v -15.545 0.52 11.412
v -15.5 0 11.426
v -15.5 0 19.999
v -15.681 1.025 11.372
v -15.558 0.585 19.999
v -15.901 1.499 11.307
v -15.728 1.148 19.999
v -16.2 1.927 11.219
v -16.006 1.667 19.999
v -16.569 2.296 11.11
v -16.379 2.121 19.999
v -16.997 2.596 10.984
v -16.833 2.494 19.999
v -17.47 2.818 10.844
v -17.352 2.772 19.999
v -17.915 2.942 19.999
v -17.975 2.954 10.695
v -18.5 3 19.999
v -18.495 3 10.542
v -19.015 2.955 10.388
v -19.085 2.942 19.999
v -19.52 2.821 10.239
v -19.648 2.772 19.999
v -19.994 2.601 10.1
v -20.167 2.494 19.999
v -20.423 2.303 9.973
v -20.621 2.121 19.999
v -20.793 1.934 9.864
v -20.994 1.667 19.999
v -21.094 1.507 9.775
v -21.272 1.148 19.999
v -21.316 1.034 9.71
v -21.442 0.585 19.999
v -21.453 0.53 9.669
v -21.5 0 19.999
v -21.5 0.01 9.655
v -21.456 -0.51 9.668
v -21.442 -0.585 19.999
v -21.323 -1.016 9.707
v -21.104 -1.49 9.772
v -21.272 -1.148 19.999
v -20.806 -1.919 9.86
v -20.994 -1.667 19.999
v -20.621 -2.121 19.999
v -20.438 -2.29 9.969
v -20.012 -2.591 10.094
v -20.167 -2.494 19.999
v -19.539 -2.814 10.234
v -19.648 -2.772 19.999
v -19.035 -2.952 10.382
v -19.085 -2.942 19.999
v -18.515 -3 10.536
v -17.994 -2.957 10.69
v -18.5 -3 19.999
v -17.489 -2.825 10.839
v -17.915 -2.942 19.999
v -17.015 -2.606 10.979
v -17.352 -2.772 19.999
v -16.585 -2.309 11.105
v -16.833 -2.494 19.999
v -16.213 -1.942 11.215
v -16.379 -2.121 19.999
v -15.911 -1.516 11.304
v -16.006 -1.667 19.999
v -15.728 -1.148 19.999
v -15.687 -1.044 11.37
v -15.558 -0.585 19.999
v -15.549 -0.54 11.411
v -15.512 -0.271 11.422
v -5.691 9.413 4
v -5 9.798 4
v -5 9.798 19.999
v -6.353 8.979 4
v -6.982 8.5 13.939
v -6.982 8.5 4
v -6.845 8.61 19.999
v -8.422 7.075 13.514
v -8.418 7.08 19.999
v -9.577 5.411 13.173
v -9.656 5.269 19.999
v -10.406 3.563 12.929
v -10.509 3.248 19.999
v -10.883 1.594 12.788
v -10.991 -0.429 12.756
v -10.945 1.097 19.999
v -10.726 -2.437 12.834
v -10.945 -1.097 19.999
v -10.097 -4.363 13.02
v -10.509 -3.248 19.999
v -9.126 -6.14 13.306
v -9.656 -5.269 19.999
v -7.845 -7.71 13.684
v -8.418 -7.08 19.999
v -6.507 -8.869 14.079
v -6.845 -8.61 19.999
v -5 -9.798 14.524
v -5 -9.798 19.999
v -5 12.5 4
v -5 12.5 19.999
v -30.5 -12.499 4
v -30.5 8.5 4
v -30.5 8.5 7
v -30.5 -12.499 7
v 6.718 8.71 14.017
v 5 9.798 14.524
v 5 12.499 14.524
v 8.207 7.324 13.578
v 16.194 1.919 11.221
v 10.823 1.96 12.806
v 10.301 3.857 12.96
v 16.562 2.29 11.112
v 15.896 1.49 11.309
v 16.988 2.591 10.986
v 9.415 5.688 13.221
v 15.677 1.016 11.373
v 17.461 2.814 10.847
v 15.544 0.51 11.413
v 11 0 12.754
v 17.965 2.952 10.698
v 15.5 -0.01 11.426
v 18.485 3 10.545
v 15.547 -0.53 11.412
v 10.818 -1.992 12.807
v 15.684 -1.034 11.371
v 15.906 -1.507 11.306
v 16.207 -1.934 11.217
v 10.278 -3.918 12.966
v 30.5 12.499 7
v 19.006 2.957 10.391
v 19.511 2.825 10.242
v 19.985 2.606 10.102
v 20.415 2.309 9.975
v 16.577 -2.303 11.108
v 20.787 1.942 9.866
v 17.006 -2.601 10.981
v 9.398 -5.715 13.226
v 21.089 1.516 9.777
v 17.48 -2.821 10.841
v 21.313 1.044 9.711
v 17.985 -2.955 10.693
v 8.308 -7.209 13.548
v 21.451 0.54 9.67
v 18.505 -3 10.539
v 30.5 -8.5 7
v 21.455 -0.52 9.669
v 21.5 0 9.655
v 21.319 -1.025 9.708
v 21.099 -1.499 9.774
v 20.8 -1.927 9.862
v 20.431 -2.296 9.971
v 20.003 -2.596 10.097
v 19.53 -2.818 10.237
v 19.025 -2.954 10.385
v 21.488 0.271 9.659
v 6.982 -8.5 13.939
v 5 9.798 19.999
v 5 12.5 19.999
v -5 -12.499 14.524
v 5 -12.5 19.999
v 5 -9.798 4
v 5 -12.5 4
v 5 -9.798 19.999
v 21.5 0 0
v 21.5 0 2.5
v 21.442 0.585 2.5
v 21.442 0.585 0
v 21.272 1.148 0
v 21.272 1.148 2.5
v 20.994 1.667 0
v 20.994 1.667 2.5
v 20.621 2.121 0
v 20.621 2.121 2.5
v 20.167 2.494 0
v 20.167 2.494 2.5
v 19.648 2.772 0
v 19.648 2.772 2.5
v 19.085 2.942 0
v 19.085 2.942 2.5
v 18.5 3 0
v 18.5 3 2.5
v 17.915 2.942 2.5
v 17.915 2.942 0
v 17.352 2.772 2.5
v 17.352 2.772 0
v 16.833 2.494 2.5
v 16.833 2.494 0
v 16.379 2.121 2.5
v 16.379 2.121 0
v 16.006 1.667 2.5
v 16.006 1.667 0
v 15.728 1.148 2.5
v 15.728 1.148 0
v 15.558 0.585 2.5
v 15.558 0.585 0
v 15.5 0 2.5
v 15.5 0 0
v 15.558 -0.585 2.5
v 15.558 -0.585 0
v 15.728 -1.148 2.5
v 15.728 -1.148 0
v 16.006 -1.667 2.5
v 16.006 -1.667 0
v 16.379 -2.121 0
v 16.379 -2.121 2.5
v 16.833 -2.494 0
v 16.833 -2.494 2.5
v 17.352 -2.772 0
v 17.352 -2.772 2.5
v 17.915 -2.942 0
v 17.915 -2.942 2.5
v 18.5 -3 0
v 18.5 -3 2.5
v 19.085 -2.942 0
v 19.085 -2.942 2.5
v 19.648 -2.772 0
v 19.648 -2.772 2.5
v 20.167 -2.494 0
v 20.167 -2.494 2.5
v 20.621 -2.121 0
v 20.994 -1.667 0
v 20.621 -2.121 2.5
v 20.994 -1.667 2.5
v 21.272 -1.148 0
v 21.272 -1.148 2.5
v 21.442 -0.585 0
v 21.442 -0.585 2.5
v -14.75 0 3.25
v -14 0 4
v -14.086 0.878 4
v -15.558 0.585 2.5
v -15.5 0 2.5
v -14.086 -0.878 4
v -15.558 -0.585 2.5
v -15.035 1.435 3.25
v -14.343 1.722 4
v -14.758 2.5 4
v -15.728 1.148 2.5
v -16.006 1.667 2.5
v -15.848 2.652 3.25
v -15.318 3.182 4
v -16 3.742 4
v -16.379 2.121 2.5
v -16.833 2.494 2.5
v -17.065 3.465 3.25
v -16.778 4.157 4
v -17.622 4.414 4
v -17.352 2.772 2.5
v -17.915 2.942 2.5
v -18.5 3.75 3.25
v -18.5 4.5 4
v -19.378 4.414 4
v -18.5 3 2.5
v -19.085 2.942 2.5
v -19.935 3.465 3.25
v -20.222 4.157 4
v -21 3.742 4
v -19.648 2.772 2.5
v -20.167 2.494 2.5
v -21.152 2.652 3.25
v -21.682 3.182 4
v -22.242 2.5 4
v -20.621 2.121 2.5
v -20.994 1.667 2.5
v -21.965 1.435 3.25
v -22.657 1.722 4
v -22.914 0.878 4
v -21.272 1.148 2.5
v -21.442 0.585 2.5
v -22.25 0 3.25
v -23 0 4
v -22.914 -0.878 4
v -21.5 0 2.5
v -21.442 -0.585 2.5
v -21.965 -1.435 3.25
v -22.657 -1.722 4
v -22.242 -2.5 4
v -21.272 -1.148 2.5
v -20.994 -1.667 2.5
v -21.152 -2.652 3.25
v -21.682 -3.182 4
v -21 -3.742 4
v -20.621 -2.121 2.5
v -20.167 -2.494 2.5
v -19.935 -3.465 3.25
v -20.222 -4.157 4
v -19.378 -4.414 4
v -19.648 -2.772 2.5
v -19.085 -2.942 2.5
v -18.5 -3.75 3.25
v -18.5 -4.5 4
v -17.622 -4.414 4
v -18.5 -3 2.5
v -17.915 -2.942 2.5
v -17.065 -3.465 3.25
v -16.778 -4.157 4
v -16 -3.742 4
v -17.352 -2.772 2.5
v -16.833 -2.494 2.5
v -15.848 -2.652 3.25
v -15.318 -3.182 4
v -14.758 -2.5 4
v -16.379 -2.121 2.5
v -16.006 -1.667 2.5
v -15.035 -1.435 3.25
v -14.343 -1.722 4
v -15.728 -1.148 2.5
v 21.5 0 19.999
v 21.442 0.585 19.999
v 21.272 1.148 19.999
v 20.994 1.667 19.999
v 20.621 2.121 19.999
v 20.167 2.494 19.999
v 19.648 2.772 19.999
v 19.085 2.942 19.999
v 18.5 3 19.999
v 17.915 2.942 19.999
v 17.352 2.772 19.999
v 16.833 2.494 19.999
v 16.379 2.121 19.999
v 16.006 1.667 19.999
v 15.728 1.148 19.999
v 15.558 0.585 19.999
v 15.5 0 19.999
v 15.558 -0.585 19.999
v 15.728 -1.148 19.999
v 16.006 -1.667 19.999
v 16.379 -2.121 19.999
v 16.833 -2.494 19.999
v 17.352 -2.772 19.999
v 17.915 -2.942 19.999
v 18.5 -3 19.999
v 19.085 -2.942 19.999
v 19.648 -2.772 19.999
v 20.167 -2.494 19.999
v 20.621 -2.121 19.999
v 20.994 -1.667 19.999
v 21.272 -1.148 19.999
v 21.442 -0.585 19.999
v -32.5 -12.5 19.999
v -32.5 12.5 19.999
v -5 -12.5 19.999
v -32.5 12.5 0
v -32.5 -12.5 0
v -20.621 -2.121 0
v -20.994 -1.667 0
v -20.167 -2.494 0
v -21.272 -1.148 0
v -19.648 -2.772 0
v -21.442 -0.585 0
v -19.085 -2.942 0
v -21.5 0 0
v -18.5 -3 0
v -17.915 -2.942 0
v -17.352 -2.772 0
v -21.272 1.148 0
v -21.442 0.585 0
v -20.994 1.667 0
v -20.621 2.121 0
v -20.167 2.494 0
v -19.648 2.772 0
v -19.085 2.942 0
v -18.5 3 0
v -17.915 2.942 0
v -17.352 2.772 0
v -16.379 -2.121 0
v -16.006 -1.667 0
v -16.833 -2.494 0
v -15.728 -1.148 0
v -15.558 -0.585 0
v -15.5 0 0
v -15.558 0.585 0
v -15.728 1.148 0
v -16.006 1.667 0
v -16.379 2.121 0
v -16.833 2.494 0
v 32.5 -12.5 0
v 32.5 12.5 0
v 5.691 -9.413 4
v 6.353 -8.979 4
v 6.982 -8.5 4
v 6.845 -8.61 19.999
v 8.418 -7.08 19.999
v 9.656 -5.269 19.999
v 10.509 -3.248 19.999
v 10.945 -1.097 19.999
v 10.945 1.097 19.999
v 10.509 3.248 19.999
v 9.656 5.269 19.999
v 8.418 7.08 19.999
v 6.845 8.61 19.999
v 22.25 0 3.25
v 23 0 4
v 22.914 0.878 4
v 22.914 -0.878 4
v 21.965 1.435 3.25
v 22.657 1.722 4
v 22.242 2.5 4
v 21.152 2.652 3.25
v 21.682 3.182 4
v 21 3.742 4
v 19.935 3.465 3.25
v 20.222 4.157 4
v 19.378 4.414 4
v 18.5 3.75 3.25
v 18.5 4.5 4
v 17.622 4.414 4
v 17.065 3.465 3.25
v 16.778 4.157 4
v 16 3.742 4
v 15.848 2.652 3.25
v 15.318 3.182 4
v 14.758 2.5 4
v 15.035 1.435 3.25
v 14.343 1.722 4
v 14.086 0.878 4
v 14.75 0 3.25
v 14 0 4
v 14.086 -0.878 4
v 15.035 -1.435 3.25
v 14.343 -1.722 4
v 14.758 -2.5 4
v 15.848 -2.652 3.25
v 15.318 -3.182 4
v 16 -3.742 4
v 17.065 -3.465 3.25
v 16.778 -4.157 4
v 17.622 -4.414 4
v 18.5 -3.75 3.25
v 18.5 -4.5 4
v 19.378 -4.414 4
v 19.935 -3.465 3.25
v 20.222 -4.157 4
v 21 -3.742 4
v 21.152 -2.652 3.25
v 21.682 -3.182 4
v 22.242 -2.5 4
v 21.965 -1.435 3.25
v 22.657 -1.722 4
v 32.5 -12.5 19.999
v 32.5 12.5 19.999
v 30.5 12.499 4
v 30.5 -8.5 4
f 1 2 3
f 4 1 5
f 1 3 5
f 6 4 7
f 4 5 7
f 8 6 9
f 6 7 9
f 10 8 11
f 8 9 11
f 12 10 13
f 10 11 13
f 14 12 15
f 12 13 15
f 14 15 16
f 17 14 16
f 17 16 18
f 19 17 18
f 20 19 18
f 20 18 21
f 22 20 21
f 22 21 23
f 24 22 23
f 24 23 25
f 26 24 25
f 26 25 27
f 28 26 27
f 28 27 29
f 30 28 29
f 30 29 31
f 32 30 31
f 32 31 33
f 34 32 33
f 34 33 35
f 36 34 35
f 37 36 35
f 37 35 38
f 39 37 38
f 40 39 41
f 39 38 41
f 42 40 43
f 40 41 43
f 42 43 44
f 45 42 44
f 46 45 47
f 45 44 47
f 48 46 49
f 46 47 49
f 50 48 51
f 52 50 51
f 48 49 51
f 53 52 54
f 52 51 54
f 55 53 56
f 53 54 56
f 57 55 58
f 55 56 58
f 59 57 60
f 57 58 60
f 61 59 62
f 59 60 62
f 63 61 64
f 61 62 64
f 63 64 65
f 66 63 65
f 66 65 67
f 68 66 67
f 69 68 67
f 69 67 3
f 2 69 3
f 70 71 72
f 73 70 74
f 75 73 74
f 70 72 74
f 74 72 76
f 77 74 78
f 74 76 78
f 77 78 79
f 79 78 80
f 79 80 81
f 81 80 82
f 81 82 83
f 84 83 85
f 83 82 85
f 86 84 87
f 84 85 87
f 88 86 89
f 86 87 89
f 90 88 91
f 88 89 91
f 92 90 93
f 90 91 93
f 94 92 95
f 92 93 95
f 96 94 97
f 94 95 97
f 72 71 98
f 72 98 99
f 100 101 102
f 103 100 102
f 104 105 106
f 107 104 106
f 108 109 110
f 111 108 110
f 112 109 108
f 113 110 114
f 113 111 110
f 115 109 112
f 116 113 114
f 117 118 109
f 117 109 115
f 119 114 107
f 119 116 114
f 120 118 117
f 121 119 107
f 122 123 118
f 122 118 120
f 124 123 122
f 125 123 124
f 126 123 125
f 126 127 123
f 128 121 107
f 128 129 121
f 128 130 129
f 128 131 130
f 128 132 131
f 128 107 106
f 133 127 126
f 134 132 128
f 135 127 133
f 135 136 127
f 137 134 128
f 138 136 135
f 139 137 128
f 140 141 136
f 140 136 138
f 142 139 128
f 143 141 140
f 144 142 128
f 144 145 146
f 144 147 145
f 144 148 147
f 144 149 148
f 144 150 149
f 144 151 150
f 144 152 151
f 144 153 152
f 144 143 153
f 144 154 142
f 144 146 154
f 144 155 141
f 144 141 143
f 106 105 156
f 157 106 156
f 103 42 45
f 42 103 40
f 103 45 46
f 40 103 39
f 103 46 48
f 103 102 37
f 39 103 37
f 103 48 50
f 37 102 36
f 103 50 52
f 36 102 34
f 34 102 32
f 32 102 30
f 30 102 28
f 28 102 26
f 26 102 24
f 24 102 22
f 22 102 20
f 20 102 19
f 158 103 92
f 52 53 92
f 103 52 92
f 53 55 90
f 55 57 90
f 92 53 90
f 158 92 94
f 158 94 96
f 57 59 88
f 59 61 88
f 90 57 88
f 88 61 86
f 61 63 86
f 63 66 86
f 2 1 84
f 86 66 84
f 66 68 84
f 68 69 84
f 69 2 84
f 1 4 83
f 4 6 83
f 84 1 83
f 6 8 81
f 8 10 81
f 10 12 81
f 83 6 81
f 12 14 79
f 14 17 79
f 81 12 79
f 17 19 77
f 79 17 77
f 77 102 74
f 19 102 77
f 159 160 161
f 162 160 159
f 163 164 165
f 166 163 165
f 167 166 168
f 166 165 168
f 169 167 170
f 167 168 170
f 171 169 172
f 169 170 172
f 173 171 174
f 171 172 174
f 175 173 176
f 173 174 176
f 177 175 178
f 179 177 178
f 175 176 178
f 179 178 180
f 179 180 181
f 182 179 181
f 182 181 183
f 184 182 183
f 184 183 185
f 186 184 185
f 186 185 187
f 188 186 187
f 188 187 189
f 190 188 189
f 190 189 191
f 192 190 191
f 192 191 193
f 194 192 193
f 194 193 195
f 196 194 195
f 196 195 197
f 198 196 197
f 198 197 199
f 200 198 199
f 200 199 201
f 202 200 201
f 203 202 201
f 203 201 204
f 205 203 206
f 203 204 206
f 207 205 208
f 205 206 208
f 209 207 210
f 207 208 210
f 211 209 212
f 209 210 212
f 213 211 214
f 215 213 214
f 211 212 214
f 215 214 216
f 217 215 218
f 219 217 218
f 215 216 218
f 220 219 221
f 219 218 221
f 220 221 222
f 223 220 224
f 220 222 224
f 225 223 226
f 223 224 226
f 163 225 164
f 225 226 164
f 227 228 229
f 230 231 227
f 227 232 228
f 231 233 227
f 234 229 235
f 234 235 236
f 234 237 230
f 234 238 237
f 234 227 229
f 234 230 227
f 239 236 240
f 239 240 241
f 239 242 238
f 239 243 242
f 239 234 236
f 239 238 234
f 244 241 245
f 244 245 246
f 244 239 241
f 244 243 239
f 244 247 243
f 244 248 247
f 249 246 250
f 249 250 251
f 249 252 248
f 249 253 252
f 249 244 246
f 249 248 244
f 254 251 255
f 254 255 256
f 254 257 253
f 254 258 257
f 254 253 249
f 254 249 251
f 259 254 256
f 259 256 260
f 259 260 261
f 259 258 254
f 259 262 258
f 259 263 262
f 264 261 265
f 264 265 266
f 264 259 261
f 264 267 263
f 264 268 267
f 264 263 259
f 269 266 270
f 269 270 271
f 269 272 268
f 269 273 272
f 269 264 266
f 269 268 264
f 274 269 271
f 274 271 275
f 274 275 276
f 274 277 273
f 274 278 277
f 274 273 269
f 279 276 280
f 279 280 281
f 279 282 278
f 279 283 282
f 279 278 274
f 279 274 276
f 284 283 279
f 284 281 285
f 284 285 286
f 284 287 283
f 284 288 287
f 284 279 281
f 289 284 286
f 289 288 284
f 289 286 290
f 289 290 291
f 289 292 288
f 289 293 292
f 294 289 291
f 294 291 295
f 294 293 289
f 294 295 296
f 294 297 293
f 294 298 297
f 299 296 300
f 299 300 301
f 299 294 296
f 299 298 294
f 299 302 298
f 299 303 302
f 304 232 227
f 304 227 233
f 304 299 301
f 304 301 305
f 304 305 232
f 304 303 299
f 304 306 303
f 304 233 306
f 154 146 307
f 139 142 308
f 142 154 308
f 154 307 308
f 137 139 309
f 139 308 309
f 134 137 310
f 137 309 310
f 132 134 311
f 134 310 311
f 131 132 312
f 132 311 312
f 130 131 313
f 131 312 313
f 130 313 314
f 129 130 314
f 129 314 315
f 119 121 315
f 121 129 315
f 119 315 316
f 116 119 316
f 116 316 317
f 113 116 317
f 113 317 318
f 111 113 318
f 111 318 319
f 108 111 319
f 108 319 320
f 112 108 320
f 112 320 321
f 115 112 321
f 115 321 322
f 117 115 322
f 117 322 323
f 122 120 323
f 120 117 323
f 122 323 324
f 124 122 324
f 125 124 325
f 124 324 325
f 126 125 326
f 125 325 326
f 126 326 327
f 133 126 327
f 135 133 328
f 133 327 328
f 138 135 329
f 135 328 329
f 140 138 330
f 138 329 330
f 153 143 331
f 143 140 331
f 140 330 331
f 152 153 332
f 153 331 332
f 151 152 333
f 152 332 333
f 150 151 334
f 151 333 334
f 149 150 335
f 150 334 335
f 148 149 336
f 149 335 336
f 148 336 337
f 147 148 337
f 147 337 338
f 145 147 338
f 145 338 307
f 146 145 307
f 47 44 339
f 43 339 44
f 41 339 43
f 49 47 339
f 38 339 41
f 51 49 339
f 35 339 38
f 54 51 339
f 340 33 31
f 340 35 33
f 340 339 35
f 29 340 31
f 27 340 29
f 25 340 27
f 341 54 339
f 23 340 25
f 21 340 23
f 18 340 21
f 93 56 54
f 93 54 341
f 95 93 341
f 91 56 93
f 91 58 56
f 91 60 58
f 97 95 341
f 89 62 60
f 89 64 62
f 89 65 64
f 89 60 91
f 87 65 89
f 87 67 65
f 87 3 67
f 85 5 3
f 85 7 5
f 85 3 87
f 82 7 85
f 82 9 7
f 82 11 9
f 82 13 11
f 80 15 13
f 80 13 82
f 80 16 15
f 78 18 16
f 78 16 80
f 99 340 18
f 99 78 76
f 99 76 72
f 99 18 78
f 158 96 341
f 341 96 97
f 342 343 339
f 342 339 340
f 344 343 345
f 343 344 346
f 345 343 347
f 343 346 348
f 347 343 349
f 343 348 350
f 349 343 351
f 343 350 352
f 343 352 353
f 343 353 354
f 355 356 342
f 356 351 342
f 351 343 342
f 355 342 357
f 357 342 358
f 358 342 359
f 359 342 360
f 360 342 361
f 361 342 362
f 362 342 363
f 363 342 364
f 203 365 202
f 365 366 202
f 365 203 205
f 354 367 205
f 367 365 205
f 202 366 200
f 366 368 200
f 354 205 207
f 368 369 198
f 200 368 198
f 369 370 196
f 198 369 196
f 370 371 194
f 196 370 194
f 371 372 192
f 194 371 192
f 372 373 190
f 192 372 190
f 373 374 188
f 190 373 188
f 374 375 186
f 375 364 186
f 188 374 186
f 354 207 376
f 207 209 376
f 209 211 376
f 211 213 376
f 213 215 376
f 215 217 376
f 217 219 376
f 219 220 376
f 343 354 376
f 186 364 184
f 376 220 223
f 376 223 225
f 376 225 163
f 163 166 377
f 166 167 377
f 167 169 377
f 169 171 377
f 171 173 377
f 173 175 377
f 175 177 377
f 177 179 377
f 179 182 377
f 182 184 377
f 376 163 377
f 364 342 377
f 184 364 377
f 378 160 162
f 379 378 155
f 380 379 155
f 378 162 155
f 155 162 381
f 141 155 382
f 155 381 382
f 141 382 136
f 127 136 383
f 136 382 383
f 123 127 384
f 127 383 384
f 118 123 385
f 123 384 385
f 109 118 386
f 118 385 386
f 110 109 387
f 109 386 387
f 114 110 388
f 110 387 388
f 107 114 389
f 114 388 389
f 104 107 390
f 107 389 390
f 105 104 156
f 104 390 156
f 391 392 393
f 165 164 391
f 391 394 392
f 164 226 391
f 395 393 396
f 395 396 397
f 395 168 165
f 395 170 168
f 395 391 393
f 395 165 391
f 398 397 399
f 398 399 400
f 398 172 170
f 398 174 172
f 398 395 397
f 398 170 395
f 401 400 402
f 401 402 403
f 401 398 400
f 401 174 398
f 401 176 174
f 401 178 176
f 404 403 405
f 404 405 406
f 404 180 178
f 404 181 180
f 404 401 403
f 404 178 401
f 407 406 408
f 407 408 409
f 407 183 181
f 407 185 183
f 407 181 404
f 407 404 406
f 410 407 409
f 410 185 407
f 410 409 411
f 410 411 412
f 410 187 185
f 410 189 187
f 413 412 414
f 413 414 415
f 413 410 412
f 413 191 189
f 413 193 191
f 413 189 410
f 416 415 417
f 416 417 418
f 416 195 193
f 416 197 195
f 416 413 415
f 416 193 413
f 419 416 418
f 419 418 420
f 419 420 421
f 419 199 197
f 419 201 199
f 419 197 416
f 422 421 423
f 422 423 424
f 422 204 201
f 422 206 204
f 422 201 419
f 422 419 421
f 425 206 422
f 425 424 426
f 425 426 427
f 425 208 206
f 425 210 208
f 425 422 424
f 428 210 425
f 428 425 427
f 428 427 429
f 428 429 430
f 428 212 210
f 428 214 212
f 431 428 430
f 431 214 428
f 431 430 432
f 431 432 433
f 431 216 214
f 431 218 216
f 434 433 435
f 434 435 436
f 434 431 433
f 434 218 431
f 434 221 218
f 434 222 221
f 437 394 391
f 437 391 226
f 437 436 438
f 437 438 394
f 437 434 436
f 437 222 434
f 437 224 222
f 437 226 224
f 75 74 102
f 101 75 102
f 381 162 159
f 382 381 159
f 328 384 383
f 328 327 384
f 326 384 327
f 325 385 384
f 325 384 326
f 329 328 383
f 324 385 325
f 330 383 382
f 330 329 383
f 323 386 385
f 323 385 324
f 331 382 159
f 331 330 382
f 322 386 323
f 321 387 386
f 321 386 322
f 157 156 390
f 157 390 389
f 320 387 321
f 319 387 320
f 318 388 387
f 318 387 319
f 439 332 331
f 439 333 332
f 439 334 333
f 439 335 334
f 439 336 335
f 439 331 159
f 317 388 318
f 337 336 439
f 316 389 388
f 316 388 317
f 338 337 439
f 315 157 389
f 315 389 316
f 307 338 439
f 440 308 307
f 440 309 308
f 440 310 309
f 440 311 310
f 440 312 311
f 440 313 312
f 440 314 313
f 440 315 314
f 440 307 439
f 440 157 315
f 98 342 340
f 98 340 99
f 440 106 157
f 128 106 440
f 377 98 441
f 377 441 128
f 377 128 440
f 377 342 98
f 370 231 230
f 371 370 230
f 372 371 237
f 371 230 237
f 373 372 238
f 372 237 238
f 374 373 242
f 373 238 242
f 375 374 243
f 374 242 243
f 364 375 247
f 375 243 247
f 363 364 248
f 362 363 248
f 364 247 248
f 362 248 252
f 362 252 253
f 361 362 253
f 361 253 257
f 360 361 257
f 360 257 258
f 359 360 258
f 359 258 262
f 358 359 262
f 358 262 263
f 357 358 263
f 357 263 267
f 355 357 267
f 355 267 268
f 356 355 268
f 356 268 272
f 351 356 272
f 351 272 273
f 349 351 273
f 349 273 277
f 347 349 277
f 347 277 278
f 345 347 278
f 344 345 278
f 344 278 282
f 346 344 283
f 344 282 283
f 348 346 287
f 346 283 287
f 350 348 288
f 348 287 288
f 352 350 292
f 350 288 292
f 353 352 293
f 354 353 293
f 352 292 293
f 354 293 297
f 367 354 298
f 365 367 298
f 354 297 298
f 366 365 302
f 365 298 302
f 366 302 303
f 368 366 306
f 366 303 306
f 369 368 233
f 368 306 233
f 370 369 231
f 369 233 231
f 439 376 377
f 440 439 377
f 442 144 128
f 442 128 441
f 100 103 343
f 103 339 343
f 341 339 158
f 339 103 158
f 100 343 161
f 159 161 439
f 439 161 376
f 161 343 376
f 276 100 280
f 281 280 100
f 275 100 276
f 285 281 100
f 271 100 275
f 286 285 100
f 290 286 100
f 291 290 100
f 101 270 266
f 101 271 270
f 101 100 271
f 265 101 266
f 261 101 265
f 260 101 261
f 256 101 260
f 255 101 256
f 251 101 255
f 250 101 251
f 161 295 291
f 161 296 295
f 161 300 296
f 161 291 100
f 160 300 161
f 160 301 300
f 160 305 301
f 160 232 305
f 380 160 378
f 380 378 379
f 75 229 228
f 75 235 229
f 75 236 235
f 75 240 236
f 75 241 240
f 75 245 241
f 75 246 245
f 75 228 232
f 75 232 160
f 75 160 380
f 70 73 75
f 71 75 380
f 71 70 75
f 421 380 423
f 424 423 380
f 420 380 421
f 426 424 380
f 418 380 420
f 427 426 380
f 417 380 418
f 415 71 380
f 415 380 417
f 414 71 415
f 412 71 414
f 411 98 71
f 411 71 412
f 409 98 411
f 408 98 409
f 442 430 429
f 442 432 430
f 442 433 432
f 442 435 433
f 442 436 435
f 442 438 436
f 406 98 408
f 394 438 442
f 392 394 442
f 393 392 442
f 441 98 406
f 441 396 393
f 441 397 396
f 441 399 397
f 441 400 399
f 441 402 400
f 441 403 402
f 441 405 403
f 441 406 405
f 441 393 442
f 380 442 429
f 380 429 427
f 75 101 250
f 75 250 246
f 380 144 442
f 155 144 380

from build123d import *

# Parameters (mm, degrees)
SKETCH_W             = 65
SKETCH_H             = 24.999
PAD_DEPTH            = 19.999
POCKET_DEPTH         = 20.9992
POCKET001_DEPTH      = 20.9992
SKETCH003_R          = 10.9995
POCKET002_DEPTH      = 15.9992
SKETCH004_W          = 9.9995
SKETCH004_H          = 15.9992
POCKET003_DEPTH      = 12.5005
POCKET003_DEPTH_BACK = -12.5005
SKETCH005_R          = 3
POCKET004_DEPTH      = 20
CHAMFER_SIZE         = 1.5


with BuildPart() as part:
    # Sketch → Pad (new body)
    with BuildSketch(Plane.XY):
        Rectangle(SKETCH_W, SKETCH_H)
    extrude(amount=PAD_DEPTH)

    # Sketch001 → Pocket (cut)
    with BuildSketch(Plane.XZ.offset(-8.4997)):
        Polygon((0, 3.9998), (-30.5, 3.9998), (-30.5, 6.9996), (0, 15.9992), align=None)
    extrude(amount=POCKET_DEPTH, mode=Mode.SUBTRACT)

    # Sketch002 → Pocket001 (cut)
    with BuildSketch(Plane.XZ.offset(8.4997)):
        Polygon((0, 3.9998), (0, 15.9992), (30.5, 6.9996), (30.5, 3.9998), align=None)
    extrude(amount=-POCKET001_DEPTH, mode=Mode.SUBTRACT)

    # Sketch003 → Pocket002 (cut)
    with BuildSketch(Plane.XY.offset(19.999)):
        Circle(SKETCH003_R)
    extrude(amount=-POCKET002_DEPTH, mode=Mode.SUBTRACT)

    # Sketch004 → Pocket003 (cut, two sides)
    with BuildSketch(Plane.XZ) as pocket003_sk:
        with Locations((0, 11.9994)):
            Rectangle(SKETCH004_W, SKETCH004_H)
    extrude(amount=-POCKET003_DEPTH, mode=Mode.SUBTRACT)
    extrude(pocket003_sk.sketch, amount=-POCKET003_DEPTH_BACK, mode=Mode.SUBTRACT)

    # Sketch005 → Pocket004 (cut, through all)
    with BuildSketch(Plane.XY.offset(19.999)):
        with Locations((-18.5, 0)):
            Circle(SKETCH005_R)
        with Locations((18.5, 0)):
            Circle(SKETCH005_R)
    extrude(amount=-POCKET004_DEPTH, mode=Mode.SUBTRACT)

    # Chamfer
    chamfer_edges = [part.edges().sort_by_distance(p)[0] for p in [
        (-21.5, 0, 3.9998),
        (15.5, 0, 3.9998),
    ]]
    chamfer(chamfer_edges, length=CHAMFER_SIZE)


solid = part.part
